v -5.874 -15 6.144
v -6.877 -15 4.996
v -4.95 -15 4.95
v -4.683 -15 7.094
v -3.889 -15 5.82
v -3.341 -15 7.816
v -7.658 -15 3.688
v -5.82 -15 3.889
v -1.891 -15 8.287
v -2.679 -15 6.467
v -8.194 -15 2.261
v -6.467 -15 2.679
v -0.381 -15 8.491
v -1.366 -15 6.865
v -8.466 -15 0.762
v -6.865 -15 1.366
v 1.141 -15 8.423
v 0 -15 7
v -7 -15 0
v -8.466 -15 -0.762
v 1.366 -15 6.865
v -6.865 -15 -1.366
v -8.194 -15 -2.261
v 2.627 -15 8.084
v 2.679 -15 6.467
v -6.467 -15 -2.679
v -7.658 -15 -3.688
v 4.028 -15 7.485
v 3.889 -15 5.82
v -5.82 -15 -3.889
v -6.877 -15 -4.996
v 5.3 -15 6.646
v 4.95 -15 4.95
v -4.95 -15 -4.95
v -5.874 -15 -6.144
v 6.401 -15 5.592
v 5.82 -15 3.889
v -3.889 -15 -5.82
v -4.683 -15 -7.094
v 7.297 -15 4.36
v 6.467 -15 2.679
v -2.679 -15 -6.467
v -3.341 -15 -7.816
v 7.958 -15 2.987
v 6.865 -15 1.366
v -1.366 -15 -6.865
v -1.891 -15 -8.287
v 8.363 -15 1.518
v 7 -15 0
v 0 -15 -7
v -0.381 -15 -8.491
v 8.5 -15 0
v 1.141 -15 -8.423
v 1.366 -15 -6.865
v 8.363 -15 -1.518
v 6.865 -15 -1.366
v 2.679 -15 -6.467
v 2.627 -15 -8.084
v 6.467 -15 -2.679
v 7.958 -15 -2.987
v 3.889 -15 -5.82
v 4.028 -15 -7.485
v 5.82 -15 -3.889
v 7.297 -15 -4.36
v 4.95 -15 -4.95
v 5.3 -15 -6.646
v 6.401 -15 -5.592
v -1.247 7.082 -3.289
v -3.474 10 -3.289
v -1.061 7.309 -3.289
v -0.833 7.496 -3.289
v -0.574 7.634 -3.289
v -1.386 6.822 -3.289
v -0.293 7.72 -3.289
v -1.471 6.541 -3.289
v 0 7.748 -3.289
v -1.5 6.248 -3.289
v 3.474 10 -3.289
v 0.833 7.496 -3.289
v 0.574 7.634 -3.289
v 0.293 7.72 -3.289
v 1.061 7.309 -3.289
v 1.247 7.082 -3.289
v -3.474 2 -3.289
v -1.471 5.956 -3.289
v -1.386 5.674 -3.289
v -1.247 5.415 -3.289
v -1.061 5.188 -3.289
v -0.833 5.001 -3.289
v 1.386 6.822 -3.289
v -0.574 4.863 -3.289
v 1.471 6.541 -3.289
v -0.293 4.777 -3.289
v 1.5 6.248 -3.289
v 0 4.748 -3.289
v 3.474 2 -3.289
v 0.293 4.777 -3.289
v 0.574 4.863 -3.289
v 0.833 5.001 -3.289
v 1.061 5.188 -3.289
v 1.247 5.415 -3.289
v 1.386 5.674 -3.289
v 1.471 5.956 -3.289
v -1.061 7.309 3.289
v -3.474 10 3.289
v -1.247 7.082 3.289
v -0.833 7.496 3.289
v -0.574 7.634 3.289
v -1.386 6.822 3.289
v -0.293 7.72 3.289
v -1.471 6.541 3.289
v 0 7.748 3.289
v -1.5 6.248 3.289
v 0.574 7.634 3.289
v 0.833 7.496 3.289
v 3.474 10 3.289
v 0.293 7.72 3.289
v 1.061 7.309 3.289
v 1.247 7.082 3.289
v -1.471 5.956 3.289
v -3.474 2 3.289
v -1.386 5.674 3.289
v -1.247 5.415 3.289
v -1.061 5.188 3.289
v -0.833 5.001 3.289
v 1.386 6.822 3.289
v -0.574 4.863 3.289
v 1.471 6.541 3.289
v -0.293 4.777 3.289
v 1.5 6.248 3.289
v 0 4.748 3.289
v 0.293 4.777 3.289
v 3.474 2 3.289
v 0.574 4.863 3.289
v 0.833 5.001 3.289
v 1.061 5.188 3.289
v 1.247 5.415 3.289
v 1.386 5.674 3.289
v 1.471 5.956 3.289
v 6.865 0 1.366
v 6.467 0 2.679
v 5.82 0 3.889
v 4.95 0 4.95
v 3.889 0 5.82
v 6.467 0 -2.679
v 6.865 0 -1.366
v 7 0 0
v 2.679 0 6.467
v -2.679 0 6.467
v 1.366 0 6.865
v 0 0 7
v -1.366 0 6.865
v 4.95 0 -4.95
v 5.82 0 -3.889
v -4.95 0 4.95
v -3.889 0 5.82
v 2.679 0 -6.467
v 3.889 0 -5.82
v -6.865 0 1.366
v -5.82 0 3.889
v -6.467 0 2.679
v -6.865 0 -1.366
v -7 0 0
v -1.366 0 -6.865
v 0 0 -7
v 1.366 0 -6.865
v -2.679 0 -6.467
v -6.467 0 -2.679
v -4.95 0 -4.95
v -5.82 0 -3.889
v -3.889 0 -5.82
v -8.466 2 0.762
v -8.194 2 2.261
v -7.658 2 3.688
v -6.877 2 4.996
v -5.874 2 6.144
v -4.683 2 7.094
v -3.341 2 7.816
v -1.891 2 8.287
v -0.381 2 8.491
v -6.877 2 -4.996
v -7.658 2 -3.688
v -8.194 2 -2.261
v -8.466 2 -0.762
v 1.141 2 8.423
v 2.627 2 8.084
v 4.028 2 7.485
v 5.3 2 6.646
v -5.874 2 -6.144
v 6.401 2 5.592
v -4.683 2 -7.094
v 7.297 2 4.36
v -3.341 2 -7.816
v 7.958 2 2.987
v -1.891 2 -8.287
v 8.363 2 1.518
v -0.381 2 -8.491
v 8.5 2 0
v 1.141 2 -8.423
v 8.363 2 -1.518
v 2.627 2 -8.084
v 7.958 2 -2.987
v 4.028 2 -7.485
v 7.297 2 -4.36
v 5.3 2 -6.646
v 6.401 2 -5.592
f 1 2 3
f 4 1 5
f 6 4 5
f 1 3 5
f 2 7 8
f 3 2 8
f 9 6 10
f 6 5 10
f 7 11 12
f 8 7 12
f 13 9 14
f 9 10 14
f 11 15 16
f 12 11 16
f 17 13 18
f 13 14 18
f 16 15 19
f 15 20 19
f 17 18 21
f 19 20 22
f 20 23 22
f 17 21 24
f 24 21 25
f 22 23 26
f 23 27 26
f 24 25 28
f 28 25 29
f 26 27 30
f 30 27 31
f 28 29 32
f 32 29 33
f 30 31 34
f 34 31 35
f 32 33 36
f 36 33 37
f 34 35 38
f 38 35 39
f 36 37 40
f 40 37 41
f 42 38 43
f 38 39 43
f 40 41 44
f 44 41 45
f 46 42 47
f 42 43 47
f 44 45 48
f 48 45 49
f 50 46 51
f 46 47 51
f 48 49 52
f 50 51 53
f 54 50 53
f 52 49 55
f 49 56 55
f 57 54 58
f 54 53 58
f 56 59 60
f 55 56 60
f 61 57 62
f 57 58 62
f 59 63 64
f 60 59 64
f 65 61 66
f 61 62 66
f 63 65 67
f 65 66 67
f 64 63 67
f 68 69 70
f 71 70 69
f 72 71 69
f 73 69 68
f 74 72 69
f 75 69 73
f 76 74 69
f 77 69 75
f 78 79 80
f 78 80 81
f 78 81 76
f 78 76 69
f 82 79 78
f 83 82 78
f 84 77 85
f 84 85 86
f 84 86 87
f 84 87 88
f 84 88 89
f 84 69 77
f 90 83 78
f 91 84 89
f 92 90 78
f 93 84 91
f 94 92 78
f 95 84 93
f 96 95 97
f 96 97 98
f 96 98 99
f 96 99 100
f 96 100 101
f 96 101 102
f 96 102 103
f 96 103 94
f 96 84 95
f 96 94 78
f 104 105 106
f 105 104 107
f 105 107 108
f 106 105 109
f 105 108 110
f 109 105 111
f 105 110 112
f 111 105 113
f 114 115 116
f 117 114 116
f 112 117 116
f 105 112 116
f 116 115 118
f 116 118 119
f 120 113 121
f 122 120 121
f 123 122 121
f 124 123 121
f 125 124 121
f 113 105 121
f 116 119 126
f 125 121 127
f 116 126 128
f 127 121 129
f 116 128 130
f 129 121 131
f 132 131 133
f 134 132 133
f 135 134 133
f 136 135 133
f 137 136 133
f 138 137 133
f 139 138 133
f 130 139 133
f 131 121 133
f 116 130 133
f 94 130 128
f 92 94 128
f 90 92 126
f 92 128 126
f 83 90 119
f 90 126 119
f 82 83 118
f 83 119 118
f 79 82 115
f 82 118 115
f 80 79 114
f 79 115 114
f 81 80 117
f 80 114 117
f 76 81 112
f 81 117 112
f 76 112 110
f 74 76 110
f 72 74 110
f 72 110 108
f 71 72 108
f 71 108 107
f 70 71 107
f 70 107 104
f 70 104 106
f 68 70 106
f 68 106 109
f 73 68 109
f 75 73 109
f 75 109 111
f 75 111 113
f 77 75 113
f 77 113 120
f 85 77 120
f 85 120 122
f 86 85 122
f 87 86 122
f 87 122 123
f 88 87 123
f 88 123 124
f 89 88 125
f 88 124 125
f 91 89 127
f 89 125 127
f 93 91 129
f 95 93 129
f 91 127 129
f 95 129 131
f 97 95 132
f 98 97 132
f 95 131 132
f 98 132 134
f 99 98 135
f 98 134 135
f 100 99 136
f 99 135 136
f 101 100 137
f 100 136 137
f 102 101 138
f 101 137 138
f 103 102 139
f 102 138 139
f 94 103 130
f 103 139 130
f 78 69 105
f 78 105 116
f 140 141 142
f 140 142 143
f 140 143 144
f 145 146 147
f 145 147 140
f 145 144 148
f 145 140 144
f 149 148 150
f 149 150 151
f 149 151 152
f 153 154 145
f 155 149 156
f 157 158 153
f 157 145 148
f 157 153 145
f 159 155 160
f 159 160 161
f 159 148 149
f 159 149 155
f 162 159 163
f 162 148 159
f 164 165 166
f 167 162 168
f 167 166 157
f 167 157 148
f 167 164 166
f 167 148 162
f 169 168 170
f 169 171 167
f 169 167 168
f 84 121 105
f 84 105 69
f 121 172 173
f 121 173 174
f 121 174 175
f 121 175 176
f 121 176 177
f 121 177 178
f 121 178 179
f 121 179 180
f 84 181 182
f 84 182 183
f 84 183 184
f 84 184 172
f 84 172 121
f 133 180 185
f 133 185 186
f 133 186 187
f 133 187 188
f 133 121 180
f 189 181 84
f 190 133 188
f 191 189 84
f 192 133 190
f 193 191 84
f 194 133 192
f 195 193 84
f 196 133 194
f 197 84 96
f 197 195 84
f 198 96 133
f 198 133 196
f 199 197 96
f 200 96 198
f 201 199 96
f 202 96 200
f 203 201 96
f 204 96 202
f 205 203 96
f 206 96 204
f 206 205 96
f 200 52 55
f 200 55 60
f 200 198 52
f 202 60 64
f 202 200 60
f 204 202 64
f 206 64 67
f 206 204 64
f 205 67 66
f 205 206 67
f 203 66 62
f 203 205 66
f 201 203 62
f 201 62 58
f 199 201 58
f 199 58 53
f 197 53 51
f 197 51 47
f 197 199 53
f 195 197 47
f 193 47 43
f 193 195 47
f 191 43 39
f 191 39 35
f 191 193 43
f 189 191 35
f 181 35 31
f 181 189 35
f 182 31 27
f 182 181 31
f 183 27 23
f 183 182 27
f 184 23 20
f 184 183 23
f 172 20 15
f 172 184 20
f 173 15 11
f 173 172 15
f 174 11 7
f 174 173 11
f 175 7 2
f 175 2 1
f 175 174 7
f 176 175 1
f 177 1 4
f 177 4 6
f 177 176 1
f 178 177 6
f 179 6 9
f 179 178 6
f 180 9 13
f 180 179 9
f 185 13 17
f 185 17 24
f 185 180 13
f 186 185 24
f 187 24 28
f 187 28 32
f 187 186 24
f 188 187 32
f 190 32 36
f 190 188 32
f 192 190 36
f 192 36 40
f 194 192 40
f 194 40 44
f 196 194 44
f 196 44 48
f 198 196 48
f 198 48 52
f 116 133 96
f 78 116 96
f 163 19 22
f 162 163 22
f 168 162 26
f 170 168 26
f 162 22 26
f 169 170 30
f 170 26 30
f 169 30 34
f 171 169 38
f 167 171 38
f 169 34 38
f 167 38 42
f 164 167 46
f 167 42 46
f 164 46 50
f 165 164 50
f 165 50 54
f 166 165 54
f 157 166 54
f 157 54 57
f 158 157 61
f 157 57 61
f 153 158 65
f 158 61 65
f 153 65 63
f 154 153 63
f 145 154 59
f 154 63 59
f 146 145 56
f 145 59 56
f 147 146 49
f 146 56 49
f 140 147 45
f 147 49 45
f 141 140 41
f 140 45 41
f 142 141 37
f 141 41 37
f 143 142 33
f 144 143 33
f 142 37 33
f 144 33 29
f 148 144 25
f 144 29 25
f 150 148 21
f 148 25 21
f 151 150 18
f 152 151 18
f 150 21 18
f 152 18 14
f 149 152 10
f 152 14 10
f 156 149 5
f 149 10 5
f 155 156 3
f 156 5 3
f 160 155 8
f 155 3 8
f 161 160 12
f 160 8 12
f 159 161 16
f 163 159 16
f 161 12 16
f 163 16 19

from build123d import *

# Parameters (mm, degrees)
SKETCH1_R           = 8.5
BOSS_EXTRUDE1_DEPTH = 2
SKETCH2_W           = 6.948756548
SKETCH2_H           = 6.57893477
BOSS_EXTRUDE2_DEPTH = 8
SKETCH3_R           = 1.5
CUT_EXTRUDE1_DEPTH  = 8
BOSS_EXTRUDE3_START = -15
SKETCH1_2_R         = 8.5
BOSS_EXTRUDE3_DEPTH = 15
SKETCH5_R           = 7
CUT_EXTRUDE2_DEPTH  = 15


with BuildPart() as part:
    # Sketch1 → Boss-Extrude1 (new body)
    with BuildSketch(Plane(origin=(0, 0, 0), x_dir=(1, 0, 0), z_dir=(0, 1, 0))):
        Circle(SKETCH1_R)
    extrude(amount=BOSS_EXTRUDE1_DEPTH)

    # Sketch2 → Boss-Extrude2 (add)
    with BuildSketch(Plane(origin=(0, 2, 0), x_dir=(1, 0, 0), z_dir=(0, 1, 0))):
        Rectangle(SKETCH2_W, SKETCH2_H)
    extrude(amount=BOSS_EXTRUDE2_DEPTH)

    # Sketch3 → Cut-Extrude1 (cut)
    with BuildSketch(Plane.XY.offset(3.289467385)):
        with Locations((0, 6.248369683)):
            Circle(SKETCH3_R)
    extrude(amount=-CUT_EXTRUDE1_DEPTH, mode=Mode.SUBTRACT)

    # Sketch1<2> → Boss-Extrude3 (add)
    with BuildSketch(Plane(origin=(0, 0, 0), x_dir=(1, 0, 0), z_dir=(0, 1, 0)).offset(BOSS_EXTRUDE3_START)):
        Circle(SKETCH1_2_R)
    extrude(amount=BOSS_EXTRUDE3_DEPTH)

    # Sketch5 → Cut-Extrude2 (cut)
    with BuildSketch(Plane(origin=(0, -15, 0), x_dir=(-1, 0, 0), z_dir=(0, -1, 0))):
        Circle(SKETCH5_R)
    extrude(amount=-CUT_EXTRUDE2_DEPTH, mode=Mode.SUBTRACT)


solid = part.part
